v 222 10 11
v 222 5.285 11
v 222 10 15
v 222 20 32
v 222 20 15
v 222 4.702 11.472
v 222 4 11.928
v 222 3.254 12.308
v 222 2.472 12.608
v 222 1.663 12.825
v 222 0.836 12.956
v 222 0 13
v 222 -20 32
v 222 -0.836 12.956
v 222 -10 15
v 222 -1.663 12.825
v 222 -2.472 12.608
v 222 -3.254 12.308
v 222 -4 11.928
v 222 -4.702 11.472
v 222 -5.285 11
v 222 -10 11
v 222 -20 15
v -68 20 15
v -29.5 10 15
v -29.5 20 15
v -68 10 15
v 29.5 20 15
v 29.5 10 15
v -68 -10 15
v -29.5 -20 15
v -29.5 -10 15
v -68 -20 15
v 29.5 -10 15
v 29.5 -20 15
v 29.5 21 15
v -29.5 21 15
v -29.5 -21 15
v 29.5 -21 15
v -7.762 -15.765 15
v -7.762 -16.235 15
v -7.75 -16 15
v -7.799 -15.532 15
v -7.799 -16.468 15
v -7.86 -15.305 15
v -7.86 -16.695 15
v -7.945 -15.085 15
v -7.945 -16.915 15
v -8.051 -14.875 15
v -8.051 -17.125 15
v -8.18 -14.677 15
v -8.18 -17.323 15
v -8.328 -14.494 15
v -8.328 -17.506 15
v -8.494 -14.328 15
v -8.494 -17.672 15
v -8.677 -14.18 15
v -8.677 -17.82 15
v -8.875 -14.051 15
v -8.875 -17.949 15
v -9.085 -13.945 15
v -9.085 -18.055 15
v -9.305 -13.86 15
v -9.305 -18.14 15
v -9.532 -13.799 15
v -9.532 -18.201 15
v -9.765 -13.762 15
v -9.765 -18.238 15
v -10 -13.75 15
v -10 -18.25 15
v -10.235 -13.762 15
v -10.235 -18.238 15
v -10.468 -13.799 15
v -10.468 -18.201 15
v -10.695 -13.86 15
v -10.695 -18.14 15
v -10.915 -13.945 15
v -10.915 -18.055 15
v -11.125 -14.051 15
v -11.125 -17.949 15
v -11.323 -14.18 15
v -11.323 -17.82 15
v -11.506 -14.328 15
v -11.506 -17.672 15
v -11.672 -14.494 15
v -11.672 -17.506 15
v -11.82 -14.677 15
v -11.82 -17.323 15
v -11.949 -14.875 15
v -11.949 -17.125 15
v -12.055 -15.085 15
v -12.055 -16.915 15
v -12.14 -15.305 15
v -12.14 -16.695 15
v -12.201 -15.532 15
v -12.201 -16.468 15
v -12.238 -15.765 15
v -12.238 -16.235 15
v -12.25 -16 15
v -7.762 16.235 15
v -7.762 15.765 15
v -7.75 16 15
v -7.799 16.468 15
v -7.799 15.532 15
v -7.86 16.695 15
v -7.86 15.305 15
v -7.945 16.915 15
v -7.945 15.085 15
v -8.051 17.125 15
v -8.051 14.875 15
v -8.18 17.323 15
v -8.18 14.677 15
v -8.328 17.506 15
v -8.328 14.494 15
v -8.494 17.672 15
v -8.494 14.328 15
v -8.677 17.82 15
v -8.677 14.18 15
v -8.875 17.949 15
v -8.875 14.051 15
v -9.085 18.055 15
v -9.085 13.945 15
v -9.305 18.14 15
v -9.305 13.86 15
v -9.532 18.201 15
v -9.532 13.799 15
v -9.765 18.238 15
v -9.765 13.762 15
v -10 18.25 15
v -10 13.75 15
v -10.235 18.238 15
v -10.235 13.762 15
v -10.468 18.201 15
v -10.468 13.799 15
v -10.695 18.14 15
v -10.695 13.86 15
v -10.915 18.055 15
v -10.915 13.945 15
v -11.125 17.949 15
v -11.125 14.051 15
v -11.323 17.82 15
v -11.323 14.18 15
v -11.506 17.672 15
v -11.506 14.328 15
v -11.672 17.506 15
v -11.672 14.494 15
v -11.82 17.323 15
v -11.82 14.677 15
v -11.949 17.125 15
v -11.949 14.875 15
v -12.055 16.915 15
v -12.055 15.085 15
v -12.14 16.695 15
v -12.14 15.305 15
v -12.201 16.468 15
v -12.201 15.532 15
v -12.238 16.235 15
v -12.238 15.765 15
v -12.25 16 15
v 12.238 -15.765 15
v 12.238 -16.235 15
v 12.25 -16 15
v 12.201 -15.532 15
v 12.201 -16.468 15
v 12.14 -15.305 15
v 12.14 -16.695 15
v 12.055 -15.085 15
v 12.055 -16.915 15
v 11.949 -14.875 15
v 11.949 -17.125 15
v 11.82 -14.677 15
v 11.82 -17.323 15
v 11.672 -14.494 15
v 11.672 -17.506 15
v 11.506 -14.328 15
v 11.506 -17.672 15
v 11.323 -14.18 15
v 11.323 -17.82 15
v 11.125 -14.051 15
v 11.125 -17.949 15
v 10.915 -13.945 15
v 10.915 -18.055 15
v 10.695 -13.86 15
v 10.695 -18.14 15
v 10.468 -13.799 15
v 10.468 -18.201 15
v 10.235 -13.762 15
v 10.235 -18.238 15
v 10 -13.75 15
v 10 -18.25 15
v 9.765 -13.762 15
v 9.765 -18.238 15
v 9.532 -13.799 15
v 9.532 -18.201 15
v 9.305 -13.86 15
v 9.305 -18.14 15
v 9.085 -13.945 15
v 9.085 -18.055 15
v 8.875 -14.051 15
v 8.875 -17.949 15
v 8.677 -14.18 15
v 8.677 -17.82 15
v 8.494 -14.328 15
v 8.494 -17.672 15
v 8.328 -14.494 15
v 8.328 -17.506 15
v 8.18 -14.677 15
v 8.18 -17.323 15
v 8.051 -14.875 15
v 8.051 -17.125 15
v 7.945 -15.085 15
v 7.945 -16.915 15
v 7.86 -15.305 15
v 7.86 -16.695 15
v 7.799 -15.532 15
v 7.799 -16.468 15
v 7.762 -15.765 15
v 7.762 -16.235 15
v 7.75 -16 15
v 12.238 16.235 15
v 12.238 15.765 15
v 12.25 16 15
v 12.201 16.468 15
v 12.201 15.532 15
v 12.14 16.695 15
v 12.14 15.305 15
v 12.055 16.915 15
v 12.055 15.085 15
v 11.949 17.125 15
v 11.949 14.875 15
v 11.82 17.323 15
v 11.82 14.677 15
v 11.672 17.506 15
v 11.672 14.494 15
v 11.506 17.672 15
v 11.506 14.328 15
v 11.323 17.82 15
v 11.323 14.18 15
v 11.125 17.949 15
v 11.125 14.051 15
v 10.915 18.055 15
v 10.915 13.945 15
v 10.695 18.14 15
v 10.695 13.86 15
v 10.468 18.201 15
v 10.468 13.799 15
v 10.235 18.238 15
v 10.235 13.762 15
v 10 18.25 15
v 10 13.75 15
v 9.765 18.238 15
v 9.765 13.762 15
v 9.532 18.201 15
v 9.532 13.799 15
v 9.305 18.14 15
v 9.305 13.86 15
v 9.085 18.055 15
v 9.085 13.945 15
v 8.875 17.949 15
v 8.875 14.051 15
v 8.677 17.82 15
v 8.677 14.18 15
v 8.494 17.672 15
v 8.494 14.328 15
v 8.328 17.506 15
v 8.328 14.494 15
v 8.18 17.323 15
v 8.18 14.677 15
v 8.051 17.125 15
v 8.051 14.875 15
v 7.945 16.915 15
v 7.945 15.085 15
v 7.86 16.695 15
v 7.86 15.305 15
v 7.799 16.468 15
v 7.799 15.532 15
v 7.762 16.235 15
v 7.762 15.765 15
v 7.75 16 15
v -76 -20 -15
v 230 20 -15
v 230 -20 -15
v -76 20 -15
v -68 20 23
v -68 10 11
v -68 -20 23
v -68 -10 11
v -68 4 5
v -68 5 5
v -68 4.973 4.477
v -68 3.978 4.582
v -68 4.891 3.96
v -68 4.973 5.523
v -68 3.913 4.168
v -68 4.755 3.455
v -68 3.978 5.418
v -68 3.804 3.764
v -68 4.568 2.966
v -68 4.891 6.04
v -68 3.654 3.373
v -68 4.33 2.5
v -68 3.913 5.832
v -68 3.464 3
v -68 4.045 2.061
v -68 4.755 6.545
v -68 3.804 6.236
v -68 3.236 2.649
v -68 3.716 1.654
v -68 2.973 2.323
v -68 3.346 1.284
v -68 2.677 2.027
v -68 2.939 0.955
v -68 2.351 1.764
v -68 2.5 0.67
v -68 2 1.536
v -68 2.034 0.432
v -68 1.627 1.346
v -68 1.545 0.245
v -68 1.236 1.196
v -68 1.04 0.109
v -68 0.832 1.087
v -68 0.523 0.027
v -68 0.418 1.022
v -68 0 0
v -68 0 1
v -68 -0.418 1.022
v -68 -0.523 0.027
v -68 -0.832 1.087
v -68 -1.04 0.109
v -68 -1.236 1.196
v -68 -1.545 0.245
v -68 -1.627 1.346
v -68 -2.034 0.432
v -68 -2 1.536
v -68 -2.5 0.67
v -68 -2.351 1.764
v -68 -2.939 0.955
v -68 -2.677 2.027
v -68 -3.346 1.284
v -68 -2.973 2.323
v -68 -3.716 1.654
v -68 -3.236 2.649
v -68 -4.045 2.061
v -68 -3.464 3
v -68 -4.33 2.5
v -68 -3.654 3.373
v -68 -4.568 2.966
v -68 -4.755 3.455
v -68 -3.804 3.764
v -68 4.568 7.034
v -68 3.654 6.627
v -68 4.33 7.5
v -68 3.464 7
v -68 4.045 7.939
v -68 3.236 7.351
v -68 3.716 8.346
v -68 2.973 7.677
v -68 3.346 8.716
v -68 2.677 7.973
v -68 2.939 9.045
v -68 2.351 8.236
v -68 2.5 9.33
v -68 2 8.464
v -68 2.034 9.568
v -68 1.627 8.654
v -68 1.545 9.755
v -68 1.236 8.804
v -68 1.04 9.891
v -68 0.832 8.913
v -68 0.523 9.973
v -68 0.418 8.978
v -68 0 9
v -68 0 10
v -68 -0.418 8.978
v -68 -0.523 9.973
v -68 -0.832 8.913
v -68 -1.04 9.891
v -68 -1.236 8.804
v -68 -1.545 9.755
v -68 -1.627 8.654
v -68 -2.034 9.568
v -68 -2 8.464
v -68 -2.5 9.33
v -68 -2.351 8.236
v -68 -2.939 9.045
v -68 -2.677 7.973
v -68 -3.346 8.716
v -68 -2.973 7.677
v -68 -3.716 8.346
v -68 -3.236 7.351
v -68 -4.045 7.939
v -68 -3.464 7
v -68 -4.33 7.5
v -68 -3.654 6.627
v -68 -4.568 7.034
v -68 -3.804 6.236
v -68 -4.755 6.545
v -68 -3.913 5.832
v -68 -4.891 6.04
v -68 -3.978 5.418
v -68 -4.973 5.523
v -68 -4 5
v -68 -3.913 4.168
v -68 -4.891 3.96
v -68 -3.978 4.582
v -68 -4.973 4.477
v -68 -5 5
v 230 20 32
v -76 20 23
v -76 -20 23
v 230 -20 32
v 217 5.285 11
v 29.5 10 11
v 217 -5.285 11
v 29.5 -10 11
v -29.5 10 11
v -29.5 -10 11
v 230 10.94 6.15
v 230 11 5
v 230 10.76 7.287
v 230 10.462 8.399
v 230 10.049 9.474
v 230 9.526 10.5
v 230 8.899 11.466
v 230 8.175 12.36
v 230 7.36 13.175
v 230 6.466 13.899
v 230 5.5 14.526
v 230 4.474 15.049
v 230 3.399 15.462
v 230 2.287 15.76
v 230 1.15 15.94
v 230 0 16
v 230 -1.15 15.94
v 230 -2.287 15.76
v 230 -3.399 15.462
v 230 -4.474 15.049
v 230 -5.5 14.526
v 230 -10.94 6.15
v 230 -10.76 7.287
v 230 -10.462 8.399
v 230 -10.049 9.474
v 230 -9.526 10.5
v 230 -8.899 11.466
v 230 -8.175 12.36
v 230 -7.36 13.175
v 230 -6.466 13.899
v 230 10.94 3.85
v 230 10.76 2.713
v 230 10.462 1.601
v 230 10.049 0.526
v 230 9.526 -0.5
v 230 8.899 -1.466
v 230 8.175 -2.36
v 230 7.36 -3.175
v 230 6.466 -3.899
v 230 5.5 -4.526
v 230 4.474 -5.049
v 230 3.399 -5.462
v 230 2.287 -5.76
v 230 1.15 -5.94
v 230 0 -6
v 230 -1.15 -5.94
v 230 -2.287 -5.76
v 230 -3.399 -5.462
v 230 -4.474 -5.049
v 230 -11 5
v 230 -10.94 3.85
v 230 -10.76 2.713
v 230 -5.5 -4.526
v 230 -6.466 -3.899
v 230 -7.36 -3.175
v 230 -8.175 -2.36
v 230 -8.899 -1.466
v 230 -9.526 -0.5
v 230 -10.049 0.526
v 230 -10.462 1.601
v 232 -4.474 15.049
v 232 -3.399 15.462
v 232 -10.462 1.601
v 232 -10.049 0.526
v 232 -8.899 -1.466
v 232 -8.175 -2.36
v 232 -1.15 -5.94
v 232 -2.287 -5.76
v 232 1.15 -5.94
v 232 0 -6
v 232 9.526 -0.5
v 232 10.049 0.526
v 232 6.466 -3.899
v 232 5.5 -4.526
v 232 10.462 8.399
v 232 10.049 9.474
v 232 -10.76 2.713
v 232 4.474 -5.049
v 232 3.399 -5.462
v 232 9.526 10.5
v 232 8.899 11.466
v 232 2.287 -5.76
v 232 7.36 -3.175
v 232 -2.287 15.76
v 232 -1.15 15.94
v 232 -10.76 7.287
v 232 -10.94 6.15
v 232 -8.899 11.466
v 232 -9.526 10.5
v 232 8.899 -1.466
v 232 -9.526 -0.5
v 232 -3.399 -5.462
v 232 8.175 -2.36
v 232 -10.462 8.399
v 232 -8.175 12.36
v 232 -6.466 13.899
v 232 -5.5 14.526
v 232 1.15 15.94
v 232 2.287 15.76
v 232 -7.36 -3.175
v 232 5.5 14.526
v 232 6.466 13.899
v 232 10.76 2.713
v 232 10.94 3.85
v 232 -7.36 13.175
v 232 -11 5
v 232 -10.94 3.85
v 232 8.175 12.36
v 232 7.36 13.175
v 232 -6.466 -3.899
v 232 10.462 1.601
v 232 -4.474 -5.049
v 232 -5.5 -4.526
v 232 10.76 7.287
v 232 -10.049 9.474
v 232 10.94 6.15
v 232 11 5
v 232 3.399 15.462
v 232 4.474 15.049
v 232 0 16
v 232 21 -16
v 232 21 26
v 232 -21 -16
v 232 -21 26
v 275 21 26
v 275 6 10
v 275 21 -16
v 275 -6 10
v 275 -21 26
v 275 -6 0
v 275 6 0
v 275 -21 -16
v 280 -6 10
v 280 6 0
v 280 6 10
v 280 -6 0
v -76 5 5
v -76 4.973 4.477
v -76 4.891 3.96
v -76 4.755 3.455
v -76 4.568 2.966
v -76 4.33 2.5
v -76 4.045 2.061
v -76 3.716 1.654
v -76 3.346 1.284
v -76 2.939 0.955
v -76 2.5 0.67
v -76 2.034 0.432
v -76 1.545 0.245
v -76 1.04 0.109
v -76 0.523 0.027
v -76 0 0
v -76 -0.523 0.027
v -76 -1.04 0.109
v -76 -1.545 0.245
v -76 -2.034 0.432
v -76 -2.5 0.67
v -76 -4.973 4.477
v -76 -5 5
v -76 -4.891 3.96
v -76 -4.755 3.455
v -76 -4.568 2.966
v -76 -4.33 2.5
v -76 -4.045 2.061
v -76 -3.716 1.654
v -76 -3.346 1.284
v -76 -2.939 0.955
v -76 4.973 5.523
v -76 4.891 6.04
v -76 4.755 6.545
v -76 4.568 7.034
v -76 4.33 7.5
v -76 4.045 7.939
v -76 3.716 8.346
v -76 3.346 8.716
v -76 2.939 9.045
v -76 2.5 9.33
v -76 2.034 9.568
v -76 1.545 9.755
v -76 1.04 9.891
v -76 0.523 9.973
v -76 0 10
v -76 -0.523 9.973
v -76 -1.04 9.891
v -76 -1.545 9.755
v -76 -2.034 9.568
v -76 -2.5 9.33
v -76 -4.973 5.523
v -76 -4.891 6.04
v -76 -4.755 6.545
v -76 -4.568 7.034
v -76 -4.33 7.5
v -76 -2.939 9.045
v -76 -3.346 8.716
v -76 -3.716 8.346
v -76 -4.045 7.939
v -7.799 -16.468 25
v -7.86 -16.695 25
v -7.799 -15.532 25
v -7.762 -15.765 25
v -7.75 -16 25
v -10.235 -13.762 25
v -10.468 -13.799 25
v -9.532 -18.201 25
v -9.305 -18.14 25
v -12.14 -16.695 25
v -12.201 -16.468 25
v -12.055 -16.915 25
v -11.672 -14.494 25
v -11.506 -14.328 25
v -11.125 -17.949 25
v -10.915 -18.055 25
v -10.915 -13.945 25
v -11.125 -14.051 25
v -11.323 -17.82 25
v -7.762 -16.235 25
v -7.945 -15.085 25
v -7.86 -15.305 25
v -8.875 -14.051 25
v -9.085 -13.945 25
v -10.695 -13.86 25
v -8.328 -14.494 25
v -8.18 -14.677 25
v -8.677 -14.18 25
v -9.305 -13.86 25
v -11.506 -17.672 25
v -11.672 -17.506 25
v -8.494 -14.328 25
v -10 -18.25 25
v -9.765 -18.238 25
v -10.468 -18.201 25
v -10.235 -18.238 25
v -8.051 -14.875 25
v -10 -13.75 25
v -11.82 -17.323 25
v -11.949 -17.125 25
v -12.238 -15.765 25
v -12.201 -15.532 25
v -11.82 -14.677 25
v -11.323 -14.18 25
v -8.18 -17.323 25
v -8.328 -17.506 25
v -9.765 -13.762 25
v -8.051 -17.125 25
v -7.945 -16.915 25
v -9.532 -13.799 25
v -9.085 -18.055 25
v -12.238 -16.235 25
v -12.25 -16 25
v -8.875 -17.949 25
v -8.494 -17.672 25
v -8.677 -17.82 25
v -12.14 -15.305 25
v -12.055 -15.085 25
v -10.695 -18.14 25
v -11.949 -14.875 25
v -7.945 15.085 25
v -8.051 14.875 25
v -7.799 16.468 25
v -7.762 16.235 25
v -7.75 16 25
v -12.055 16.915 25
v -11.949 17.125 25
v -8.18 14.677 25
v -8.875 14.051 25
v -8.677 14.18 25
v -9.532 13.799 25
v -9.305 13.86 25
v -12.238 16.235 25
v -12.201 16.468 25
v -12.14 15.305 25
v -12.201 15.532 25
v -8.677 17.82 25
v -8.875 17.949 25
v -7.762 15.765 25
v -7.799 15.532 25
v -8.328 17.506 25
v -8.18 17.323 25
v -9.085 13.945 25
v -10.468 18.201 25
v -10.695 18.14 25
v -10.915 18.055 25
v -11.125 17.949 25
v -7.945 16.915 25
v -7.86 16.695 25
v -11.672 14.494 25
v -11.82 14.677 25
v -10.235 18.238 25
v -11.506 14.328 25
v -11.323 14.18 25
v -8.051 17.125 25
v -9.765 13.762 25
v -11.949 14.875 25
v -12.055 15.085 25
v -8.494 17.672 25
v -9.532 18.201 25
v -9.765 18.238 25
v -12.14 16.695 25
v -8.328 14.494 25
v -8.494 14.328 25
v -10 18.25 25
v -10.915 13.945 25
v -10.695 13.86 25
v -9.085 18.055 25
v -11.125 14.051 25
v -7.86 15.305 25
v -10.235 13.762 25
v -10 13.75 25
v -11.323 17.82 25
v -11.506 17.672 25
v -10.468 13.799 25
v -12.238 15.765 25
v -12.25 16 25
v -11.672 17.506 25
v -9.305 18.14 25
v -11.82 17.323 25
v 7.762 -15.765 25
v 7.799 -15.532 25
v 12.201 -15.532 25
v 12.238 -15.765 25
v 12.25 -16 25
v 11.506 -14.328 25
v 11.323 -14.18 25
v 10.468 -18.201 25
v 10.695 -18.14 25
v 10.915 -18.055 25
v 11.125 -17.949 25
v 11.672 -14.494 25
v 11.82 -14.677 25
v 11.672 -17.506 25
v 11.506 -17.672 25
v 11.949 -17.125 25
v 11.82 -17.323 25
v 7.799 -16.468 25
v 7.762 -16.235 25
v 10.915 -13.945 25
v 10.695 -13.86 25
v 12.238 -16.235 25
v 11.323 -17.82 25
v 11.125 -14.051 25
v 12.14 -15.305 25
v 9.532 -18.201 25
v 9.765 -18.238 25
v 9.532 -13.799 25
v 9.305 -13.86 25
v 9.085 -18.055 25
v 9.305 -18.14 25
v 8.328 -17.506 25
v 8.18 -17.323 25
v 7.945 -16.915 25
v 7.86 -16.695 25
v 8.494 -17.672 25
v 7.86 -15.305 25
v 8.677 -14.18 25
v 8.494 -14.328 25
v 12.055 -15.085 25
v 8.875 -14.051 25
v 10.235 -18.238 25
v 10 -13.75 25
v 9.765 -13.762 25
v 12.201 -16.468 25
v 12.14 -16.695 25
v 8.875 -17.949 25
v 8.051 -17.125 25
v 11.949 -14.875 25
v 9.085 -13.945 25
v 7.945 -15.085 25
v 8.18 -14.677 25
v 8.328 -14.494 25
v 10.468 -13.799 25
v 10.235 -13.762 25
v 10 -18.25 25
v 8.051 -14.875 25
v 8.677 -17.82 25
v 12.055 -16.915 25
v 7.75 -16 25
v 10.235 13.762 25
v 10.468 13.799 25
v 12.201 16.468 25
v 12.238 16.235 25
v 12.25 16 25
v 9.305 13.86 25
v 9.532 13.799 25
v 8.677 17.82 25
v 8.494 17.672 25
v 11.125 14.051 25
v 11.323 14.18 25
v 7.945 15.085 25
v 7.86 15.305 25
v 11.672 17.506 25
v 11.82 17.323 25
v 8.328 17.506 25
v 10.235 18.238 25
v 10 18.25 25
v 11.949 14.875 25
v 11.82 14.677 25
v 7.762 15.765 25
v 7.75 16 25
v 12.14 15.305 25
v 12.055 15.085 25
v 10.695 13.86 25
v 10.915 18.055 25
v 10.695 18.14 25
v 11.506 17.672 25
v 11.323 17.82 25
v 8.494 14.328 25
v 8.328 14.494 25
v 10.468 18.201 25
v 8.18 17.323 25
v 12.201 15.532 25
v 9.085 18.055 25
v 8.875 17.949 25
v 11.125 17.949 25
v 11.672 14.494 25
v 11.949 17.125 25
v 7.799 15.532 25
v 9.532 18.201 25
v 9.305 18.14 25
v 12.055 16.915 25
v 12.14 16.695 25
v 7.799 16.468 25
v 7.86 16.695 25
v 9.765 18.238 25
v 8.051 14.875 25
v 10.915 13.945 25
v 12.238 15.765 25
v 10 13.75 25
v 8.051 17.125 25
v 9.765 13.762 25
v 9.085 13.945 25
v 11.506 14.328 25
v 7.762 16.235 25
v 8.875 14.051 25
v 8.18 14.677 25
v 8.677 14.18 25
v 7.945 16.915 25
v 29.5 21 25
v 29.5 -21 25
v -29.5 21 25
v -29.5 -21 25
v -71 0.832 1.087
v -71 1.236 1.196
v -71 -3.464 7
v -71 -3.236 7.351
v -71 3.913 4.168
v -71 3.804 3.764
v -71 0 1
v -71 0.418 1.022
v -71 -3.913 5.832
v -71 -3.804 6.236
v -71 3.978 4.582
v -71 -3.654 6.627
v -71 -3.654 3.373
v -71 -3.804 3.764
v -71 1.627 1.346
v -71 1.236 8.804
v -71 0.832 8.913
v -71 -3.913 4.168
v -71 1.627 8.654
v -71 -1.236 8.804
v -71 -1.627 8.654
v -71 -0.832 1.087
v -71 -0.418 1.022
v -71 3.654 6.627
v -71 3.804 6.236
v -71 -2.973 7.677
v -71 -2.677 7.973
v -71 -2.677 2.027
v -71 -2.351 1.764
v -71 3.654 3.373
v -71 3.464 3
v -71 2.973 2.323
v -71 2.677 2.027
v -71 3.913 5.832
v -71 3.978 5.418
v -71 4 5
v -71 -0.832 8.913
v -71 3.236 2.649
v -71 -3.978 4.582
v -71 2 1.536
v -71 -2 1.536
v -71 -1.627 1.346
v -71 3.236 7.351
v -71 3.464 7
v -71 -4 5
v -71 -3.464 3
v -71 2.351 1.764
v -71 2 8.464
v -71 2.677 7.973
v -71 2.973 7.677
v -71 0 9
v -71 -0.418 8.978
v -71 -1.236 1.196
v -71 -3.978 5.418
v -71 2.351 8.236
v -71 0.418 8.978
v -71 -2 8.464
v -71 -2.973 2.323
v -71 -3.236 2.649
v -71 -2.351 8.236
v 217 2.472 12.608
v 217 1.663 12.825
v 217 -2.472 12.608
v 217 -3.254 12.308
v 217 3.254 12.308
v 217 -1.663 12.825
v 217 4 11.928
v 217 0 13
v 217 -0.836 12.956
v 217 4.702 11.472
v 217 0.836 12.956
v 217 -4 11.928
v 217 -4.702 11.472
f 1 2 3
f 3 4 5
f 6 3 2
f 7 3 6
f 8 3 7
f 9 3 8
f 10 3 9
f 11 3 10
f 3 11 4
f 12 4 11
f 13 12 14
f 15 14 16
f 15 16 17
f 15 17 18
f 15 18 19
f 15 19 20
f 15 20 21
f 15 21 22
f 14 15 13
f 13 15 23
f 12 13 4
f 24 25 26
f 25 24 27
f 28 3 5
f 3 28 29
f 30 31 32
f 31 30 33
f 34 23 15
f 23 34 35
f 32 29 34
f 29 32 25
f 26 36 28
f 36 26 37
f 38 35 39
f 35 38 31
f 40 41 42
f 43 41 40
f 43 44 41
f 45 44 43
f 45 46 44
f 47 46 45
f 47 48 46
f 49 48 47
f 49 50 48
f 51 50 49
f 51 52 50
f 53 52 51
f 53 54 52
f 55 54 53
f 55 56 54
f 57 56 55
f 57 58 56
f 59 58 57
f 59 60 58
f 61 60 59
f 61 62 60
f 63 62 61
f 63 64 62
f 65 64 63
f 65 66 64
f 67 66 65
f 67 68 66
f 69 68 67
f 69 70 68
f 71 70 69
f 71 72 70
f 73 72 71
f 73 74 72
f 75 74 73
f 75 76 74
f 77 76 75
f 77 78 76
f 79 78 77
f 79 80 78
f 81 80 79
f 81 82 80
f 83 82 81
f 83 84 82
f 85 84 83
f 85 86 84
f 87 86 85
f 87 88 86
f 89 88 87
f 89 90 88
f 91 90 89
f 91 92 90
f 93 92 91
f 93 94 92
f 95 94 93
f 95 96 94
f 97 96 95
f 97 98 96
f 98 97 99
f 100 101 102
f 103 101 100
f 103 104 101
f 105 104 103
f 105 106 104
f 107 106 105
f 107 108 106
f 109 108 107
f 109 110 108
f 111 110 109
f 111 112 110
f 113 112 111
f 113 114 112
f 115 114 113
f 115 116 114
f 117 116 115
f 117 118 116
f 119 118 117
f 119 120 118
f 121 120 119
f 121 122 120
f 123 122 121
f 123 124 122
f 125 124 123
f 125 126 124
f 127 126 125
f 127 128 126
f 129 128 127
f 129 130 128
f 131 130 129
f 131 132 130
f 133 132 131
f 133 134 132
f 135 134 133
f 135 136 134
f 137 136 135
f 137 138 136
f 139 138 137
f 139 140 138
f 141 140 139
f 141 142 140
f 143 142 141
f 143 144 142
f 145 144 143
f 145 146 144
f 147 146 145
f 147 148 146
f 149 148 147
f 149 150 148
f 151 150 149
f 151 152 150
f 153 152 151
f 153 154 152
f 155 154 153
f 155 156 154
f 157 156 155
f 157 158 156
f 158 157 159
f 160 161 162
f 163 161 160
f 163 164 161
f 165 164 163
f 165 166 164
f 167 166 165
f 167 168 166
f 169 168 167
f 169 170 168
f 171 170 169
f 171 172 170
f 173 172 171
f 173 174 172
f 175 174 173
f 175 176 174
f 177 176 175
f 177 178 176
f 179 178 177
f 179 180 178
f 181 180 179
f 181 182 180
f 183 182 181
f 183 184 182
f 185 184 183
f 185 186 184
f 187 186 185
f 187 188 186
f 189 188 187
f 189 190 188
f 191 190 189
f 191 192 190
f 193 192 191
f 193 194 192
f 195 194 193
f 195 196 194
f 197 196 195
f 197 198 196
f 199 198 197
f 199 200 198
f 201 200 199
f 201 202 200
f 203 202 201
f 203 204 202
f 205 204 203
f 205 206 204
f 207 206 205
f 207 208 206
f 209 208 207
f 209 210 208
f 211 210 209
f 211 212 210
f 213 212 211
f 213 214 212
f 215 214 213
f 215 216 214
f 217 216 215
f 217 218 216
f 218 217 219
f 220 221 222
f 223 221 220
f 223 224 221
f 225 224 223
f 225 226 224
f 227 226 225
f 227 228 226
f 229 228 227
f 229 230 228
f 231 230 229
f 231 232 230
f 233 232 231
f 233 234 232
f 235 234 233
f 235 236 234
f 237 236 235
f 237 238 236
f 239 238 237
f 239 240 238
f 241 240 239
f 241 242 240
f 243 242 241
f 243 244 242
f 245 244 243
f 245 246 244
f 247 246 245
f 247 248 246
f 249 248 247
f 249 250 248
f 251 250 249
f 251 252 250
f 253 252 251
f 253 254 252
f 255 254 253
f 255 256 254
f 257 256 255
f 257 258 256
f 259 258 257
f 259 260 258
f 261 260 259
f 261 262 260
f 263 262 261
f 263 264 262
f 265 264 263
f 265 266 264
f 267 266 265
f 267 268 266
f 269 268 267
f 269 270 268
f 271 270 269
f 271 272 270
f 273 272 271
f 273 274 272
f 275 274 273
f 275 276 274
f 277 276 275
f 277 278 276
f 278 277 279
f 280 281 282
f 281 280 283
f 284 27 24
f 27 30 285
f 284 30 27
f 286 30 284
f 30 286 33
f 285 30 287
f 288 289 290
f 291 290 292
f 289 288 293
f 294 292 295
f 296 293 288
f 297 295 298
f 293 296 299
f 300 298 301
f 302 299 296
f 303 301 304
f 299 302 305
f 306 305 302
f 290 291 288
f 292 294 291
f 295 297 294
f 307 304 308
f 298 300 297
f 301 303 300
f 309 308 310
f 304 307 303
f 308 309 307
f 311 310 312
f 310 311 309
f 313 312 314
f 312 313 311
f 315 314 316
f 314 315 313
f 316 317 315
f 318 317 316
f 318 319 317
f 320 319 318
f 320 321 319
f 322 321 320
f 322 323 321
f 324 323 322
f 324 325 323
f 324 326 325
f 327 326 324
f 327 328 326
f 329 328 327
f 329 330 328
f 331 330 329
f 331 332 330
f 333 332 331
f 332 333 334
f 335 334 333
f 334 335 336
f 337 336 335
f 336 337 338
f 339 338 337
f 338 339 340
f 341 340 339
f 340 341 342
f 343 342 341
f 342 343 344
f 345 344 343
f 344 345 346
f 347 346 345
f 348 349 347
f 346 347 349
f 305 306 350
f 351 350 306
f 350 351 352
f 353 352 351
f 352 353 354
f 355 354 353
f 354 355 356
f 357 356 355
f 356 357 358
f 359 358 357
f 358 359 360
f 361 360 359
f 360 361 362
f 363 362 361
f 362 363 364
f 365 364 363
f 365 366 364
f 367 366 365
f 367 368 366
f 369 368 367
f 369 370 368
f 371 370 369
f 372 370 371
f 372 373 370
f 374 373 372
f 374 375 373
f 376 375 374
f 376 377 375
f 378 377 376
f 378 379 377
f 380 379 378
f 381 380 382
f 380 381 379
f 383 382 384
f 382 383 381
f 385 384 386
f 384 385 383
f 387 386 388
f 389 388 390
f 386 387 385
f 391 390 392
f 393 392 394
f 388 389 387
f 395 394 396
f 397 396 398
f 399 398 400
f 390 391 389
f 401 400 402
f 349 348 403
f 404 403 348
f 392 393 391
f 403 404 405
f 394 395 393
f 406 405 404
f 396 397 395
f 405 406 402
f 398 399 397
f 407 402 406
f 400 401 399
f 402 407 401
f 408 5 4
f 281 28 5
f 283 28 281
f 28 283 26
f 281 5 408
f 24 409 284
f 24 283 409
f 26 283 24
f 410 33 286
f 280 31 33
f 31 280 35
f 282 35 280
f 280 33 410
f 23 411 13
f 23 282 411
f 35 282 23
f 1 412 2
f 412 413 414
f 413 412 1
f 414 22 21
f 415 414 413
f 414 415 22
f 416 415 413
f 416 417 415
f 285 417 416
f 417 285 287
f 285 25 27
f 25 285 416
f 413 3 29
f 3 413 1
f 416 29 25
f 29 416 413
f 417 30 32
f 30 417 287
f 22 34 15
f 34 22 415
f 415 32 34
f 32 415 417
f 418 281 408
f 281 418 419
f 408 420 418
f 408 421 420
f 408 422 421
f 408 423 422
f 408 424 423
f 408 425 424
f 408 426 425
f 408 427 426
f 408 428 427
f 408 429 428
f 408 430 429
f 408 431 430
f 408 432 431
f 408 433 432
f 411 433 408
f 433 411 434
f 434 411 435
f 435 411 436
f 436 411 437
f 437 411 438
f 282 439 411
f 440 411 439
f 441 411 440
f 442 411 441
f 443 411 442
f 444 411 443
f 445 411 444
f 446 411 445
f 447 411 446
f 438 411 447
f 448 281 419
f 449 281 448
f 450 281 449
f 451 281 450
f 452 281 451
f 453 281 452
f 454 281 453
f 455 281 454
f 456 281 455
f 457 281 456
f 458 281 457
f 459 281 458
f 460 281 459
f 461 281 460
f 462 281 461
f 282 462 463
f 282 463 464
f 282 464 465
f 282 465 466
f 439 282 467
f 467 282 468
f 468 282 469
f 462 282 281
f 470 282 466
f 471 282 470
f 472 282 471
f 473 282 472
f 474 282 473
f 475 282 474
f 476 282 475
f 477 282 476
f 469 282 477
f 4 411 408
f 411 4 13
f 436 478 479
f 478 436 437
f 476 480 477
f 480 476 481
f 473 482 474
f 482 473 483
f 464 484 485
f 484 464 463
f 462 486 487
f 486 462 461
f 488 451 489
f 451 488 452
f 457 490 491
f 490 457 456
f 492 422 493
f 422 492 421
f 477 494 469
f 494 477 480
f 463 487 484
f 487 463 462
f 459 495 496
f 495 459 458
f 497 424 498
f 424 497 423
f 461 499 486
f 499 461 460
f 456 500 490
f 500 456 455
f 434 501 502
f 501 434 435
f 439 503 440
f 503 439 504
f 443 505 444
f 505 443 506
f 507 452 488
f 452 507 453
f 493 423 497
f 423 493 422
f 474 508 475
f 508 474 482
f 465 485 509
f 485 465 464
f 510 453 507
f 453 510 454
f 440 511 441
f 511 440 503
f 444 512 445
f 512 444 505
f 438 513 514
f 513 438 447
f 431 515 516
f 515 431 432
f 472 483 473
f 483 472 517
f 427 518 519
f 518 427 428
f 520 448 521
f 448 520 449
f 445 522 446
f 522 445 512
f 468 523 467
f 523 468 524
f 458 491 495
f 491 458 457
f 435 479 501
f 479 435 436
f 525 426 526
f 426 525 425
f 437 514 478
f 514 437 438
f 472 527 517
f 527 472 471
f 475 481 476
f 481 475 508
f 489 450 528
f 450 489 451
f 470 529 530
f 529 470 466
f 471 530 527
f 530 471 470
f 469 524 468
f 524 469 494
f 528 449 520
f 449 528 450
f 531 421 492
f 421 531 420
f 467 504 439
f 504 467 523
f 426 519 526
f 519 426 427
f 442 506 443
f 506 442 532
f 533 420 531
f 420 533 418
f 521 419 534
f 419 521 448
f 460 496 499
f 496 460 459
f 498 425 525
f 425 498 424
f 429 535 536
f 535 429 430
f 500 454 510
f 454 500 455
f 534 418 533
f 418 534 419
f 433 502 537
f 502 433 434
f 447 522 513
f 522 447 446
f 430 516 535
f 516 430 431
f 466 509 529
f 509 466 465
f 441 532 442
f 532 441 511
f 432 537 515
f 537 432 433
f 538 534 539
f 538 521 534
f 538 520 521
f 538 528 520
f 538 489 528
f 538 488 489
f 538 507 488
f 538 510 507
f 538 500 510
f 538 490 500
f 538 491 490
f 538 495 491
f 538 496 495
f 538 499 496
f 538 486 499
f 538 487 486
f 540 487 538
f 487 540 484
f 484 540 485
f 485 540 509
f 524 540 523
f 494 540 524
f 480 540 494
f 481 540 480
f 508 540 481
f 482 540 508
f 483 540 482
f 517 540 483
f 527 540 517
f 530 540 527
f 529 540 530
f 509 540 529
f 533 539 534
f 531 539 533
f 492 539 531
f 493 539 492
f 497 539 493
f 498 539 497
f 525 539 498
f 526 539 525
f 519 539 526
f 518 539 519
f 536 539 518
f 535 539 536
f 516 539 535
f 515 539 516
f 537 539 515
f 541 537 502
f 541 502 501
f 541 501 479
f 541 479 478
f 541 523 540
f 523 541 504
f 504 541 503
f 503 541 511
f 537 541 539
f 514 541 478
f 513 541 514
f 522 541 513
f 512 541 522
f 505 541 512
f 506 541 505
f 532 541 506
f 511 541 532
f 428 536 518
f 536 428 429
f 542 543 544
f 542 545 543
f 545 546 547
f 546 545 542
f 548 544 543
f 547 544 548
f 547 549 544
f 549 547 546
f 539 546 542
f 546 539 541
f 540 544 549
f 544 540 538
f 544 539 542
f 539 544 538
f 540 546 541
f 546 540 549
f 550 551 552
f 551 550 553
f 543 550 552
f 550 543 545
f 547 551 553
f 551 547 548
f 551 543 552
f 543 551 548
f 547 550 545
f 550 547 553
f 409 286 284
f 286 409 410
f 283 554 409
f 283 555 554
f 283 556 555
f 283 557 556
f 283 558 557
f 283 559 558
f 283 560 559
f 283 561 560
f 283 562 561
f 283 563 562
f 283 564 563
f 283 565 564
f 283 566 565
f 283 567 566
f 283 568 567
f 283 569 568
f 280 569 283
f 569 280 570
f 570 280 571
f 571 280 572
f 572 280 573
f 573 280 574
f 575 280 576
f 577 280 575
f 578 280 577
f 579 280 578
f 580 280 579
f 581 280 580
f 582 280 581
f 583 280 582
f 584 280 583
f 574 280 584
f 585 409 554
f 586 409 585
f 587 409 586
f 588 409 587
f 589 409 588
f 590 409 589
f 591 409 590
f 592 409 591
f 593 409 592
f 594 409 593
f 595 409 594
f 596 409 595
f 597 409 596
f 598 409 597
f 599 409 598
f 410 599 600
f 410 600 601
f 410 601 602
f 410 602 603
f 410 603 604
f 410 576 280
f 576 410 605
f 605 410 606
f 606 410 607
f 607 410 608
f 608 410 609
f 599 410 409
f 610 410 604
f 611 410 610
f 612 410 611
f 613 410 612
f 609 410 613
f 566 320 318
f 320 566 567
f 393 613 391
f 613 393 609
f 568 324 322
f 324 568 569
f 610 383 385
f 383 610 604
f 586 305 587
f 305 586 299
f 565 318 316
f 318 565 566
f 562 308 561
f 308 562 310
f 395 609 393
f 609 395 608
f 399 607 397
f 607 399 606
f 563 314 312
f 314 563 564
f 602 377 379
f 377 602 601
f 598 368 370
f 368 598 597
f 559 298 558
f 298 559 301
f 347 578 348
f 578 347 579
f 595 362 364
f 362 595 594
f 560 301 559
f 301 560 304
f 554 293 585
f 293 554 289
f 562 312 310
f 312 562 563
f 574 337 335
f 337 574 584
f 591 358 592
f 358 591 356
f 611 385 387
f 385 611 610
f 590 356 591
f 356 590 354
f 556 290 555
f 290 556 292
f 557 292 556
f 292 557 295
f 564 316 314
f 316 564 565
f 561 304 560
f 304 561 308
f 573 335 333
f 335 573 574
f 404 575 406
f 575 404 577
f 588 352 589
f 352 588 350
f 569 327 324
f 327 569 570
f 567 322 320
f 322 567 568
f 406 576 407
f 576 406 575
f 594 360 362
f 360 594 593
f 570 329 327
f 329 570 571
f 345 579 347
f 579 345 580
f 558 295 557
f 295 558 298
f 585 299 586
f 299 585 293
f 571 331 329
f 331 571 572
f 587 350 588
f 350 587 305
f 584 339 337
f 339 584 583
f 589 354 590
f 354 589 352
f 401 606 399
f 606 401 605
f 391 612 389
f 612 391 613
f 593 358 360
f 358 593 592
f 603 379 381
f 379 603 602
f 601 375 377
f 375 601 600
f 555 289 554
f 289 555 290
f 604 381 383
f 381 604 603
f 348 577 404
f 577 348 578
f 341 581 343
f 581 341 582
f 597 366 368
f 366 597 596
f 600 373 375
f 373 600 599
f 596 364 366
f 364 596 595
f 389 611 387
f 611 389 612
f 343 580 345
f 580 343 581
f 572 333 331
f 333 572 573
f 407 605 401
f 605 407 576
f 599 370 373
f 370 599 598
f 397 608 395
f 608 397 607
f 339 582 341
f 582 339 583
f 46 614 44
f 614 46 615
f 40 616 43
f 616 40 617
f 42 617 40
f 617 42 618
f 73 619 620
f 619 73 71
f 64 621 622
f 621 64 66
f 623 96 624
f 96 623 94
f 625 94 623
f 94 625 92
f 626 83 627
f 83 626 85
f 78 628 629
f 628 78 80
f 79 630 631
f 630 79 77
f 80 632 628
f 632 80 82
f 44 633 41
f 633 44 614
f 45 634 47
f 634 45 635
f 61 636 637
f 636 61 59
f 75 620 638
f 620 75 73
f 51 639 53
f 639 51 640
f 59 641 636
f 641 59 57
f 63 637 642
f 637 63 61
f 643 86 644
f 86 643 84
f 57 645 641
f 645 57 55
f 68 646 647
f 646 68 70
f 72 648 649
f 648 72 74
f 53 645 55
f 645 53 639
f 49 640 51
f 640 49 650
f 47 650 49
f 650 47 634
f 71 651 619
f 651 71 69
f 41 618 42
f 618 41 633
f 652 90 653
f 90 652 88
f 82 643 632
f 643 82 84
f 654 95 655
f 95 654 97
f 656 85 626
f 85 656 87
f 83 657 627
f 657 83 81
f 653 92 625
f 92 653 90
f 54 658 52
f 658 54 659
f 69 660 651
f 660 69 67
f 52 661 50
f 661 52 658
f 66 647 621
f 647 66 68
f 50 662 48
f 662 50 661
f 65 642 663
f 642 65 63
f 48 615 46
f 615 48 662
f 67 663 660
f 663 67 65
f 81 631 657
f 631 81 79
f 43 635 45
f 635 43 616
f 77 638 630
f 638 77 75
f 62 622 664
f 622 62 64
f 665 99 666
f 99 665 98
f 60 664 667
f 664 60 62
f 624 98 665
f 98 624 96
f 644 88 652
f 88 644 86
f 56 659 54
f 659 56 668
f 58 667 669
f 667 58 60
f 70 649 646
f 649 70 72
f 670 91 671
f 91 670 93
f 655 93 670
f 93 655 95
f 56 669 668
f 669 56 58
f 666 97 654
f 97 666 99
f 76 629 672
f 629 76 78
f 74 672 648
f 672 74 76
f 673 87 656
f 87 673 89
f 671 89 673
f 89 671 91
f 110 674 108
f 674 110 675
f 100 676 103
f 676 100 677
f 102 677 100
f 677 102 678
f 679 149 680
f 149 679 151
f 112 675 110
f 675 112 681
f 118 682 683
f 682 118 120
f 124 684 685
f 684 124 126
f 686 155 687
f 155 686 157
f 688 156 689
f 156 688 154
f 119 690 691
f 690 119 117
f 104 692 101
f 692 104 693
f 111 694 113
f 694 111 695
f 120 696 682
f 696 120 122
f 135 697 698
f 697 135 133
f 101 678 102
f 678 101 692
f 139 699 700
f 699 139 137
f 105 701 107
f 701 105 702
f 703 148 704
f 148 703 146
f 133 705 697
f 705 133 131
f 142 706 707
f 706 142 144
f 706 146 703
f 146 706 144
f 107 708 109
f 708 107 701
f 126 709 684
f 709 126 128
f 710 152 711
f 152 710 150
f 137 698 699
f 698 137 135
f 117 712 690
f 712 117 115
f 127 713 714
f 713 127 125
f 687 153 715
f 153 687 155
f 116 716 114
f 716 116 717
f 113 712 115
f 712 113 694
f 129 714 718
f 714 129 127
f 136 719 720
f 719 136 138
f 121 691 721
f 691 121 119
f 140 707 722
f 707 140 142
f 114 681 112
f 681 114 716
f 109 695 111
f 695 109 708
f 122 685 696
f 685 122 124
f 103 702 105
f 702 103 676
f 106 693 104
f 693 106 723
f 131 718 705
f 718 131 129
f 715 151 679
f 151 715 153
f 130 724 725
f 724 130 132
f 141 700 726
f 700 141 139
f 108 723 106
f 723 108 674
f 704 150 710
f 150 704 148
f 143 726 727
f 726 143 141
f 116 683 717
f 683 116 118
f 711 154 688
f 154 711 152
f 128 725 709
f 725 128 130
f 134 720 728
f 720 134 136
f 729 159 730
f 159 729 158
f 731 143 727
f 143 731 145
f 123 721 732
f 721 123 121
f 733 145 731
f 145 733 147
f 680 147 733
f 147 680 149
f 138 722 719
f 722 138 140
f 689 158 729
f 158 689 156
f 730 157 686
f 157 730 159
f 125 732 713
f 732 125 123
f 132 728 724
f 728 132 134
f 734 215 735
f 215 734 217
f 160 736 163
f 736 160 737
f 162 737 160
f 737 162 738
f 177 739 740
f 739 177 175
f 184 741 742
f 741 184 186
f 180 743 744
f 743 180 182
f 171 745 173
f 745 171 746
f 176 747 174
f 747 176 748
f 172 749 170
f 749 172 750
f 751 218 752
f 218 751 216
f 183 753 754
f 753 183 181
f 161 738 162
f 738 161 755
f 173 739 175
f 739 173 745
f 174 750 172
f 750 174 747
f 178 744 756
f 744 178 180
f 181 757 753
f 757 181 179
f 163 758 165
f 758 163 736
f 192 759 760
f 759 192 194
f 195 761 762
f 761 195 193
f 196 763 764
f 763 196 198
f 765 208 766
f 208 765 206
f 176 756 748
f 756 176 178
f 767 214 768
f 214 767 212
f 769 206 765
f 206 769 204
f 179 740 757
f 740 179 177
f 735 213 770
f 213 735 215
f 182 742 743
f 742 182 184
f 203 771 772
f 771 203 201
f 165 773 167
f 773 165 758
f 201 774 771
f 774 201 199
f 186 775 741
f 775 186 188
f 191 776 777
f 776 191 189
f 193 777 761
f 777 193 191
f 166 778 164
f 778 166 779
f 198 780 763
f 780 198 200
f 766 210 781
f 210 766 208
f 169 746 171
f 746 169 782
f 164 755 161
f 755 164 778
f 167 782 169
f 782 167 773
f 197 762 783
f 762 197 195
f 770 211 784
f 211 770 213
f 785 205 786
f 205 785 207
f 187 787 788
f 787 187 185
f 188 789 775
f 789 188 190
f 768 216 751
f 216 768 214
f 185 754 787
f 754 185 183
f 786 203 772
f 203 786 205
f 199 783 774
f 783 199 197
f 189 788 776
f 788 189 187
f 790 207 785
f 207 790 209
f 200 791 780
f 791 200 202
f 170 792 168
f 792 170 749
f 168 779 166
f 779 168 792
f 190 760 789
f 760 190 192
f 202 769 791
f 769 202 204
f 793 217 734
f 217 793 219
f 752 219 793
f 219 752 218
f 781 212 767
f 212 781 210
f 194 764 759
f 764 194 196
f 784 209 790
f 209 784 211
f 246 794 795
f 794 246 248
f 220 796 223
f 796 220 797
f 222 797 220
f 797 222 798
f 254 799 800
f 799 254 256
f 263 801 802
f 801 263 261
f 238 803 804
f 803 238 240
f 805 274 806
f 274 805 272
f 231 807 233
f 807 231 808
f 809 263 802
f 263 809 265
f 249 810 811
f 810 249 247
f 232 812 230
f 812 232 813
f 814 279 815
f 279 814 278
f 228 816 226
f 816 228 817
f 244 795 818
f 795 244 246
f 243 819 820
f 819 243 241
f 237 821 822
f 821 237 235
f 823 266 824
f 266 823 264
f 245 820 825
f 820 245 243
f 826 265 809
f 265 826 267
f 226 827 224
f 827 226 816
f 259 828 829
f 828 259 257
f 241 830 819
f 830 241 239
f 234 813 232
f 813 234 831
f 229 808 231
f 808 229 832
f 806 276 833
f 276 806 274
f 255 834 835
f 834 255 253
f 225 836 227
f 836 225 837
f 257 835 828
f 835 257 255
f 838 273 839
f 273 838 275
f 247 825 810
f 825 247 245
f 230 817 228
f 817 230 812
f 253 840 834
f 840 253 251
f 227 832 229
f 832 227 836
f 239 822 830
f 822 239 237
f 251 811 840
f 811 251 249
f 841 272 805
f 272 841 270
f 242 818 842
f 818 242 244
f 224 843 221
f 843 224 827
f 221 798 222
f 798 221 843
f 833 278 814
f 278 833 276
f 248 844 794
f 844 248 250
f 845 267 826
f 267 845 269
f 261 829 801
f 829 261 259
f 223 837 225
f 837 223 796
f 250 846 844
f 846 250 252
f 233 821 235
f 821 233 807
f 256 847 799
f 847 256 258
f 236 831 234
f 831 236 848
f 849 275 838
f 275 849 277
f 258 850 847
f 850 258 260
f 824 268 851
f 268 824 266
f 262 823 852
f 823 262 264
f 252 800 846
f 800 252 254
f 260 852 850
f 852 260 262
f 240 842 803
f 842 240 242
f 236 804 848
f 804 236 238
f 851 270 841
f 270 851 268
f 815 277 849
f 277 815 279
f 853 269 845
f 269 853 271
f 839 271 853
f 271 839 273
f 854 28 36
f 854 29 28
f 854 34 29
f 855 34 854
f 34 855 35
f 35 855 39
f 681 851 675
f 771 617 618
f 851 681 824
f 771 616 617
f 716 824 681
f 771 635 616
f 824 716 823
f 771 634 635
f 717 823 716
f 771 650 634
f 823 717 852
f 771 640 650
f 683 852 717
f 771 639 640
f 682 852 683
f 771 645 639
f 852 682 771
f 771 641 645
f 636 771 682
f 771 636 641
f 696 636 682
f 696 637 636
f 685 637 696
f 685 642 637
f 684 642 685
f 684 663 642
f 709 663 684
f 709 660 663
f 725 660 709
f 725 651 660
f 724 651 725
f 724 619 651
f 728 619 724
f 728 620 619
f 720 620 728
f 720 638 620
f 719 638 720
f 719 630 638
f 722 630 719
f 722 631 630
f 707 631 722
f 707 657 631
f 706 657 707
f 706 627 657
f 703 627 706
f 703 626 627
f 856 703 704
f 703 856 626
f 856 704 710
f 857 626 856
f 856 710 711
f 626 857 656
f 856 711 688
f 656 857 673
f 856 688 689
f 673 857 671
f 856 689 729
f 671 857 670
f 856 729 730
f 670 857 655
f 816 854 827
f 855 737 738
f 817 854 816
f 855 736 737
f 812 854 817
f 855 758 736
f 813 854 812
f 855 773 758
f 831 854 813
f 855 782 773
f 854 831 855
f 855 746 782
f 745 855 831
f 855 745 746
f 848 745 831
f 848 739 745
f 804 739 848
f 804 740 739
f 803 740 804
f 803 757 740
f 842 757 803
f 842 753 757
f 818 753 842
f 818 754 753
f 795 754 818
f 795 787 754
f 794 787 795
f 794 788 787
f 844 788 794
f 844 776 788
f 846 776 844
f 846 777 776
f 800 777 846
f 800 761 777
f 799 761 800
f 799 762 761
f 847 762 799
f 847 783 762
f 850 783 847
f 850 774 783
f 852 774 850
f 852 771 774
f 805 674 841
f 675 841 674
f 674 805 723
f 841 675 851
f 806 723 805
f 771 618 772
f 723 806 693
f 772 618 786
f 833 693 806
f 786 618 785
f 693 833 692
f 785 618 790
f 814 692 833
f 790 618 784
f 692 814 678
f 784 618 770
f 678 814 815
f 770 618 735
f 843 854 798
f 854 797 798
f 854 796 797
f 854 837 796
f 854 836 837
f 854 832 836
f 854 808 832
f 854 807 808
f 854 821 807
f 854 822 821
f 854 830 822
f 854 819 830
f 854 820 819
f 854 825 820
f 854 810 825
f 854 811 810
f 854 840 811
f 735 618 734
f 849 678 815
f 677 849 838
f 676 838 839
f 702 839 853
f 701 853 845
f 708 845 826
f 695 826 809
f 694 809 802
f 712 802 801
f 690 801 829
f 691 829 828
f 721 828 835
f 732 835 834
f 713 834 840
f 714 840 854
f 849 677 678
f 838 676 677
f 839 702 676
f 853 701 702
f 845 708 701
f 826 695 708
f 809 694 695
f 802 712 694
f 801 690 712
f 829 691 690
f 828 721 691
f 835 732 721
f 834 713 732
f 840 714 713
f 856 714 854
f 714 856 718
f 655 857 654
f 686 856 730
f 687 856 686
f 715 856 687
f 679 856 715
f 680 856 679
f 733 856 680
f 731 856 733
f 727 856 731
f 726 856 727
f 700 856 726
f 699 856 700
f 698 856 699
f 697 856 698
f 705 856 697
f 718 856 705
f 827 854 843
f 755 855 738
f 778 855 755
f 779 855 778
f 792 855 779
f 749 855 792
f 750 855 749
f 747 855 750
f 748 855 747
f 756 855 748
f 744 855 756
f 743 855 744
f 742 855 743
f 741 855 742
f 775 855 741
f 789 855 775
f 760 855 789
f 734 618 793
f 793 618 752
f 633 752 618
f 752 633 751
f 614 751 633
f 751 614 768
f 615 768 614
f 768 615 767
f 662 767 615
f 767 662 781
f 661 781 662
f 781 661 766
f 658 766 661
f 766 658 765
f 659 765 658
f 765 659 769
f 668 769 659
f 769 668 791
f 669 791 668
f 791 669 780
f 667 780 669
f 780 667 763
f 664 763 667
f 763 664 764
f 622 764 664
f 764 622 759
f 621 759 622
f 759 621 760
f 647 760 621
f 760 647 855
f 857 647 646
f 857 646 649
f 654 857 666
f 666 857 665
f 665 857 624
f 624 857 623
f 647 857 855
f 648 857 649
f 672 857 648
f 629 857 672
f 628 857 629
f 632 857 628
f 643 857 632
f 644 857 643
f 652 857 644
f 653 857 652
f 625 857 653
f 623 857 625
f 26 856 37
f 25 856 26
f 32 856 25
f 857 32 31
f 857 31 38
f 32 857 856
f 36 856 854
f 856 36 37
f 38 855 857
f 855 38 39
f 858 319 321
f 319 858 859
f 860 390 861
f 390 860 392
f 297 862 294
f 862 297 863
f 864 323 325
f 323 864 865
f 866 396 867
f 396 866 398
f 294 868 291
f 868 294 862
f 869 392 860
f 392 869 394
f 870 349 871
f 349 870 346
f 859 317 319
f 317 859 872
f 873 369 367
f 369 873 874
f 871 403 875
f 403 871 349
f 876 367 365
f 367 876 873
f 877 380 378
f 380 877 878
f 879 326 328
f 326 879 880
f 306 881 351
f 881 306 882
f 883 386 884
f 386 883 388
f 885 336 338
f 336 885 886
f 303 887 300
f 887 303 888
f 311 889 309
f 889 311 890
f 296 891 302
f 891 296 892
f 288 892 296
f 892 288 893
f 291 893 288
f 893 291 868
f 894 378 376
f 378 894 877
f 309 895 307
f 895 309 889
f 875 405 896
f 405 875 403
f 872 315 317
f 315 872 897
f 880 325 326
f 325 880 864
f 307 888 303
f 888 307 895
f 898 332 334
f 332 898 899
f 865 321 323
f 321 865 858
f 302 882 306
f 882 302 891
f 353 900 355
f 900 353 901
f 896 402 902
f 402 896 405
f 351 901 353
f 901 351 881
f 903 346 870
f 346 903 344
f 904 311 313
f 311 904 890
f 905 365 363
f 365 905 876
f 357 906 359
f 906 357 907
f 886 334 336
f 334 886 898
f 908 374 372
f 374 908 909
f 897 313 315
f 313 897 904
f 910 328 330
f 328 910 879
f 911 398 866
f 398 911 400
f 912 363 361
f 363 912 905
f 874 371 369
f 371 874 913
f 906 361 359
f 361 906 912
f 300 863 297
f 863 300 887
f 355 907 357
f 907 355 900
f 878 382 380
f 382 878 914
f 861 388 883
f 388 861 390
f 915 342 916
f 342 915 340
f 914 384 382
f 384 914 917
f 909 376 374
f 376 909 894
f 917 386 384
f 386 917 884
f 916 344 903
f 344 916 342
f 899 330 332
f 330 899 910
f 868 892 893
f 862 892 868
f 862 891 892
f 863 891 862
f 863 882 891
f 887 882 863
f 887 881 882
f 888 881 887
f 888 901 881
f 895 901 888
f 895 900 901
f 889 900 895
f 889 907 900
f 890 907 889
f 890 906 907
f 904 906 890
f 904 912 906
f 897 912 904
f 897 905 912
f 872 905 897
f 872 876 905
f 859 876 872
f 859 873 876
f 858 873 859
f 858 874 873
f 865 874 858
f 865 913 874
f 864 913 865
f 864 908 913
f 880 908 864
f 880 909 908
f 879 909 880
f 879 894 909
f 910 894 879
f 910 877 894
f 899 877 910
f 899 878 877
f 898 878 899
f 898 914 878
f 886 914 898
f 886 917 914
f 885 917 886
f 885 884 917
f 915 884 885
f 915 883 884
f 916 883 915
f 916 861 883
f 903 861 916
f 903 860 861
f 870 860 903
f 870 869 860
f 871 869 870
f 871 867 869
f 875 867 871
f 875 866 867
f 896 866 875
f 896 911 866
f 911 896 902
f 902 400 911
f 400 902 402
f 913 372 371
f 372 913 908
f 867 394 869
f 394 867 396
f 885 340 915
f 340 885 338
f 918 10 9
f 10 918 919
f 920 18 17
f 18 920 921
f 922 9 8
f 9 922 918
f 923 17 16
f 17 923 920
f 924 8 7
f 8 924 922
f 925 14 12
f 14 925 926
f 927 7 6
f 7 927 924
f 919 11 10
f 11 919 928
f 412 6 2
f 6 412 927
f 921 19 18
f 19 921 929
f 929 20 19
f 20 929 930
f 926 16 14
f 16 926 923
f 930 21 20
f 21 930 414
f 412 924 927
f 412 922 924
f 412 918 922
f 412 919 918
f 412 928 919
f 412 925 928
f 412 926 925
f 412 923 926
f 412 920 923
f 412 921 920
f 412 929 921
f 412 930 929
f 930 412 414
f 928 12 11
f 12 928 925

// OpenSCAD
// file: _params.scad
// =========================================================================
// 공유 파라미터 (모든 개별 부품 파일에서 include)
// 메인 어셈블리: cup_z_x_catrage_frame_water_mic_anti_3030.scad 에서 추출
// 프레임: 600 × 420 × 700mm (3030 프로파일, Y=0 대칭)
// =========================================================================

$fn = 60;  // 부품 출력용 고해상도
GLOBAL_TOLERANCE = 0.2;

// --- [1] 하부 기성품 및 원통 파라미터 ---
X_RAIL_LEN = 290.0;
X_BLOCK_W = 42.0; X_BLOCK_L = 59.0;
X_PITCH_X = 20.0; X_PITCH_Y = 32.0;
X_RAIL_W = 40.0;  X_RAIL_H = 30.0;

MOTOR_W = 42.0;      MOTOR_PITCH = 31.0; MOTOR_HOLE_D = 3.5;    
MOTOR_BOSS_D = 22.0; MOTOR_BOSS_H = 2.0; SCREW_D = 8.0;         

CUP_ID = 100.0;  CUP_WALL = 5.0; CUP_OD = 110.0;     // 아크릴 원통 OD110/ID100
CUP_H = 180.0;   CAGE_H = 60.0;  FLOOR_H = 10.0; PISTON_H = 20.0;     

LIP_D = 30.0;    LIP_H = 5.0;    LEAK_DRAIN_D = 4.0;    
GUIDE_PIPE_D = 10.0; BUSHING_OD = 12.0; BUSHING_H = 8.0;       
DRAIN_RADIUS = 35.0; DRAIN_D = 10.0;        

Y_OFFSET = 85.0; BRKT_H = 12.0; BRKT_D = 122.0; BRKT_ID = 62.0; Z_MOUNT_PCD = 86.0;   

// --- [2] 아크릴 파이프 및 상부 카트리지 ---
ACRYL_ID = 100.0; ACRYL_T = 5.0; ACRYL_OD = ACRYL_ID + (ACRYL_T * 2);  // OD110 (아크릴집 106 재고없음 → 컵과 동일 규격)

REVOLVER_PCD = 240.0;     // 인접 카트리지 웹 9.8mm 확보 (OD110 대응, 230→240)
CARTRIDGE_OD = REVOLVER_PCD + ACRYL_OD + 8; 
TOP_PLATE_H = 15.0;       // 아크릴 15T 통판 (보스홀 단 깊이 10mm)

HUB_D = 60.0;            
SHAFT_D = 12.0;          
HUB_WALL = 4.0;          
HUB_H = 15.0;             // 아크릴 5T × 3장 적층 — 파이프 130mm 대응
POCKET_DEPTH = 5.0;
MID_HUB_Z = 68.5;          // 중단 허브 하면 Z (FLOAT_H=2 보정, 절대좌표 유지)
UPPER_HUB_Z = 135.0;       // 상단 허브 하면 Z (전체 135+15=150 유지)
BOSS_OD = 35.0;
BOSS_H = 11.0;             // 보스11 + 와셔1 = 12, 리세스10 → 허브 2mm 공중

// --- [3] GT2 벨트 구동 시스템 ---
GT2_PITCH     = 2.0;
GT2_BELT_W    = 6.0;
BIG_PULLEY_TEETH = 566;
BIG_PULLEY_PD = BIG_PULLEY_TEETH * GT2_PITCH / PI;
BIG_PULLEY_OD = BIG_PULLEY_PD + 1.0;
SMALL_PULLEY_TEETH = 20;
SMALL_PULLEY_PD = SMALL_PULLEY_TEETH * GT2_PITCH / PI;
SMALL_PULLEY_OD = SMALL_PULLEY_PD + 1.0;

BELT_MOTOR_X = -300;
BELT_MOTOR_Y = -155.5;
BRKT_MOTOR_H = 25.0;
BRKT_MOTOR_W = 45.0;
SLOT_LEN = 10.0;
FLAG_W = 15.0;  FLAG_H = 8.0;  FLAG_T = 1.5;

X_POS_MEASURE = 170.0;   // X_M~X_R 정중앙, X대칭

// --- [4] 3030 프레임 경계 (600×430×700mm) ---
PF = 30;             // 3030 알루미늄 프로파일
WASHER_T = 1.0;     

X_L = -320;
X_M = 60;
X_R = 250;
Y_F = -210;          // 전방 (대칭: -210+30=-180, Y=0 중심)
Y_B = 180;           // 후방 (대칭: 180+30=210, Y=0 중심) — 메인파일과 동기화

Z_BOT = -480;
Z_RAIL = -322;
Z_MID = -TOP_PLATE_H - PF;
Z_TOP = 220;

SUPPORT_PILLAR_H = Z_TOP - PF;

SHAFT_SQ = 20;       // 2020 사각 회전축

// 사각 축 홀 크기
SQ = SHAFT_SQ + GLOBAL_TOLERANCE;  // 20.2mm

// --- 리볼버/컵 축 정렬 (보스홀=판 중심에 리볼버 정렬) ---
REVOLVER_CX = (X_L + X_M + PF)/2;        // 판 중심 = 보스홀 = 리볼버 회전축 (-115)
DROP_X      = REVOLVER_CX + REVOLVER_PCD/2;  // 링 드롭 / 컵 적재 축 (+5)

// --- [5] 모터 체결홀 (베이스 플레이트 ↔ 모터 브래킷 슬롯 공유) ---
MOTOR_BOLT_PITCH    = 25;        // Y피치 (모터축 기준 ±12.5)
MOTOR_BOLT_X_NOMINAL = X_L + 55; // 1열: 판 좌단 55 (모터 기본 위치)
MOTOR_BOLT_X_SHIFT   = X_L + 40; // 2열: 판 좌단 40 (모터 좌측 이동 대비)

// 모터 마운트 볼트 카운터보어 (단볼트용 — 브래킷 두께 25 중 깊게 파냄)
MOTOR_CB_D     = 6.5;            // M3 캡볼트 머리 클리어런스
MOTOR_CB_DEPTH = 19;             // 카운터보어 깊이 (잔여 통과 6mm → M3×10 단볼트)
// main file
// =========================================================================
// [구매] X축 리니어 스테이션 세트 × 2 (전방 Y=-85, 후방 Y=+85)
// 구매: 리니어 레일(290mm) + 슬라이더 + NEMA17 + 리드스크류 + 엔드브래킷 + 커플링
// 메인 파일 x_stage_rail_dummy() + x_slider_block_dummy() 그대로 복사
// =========================================================================
include <_params.scad>

SCREW_CZ = 5;
MOT_BODY_L = 43;
BRKT_T_X = 8;
MOTOR_EXTEND = BRKT_T_X + MOTOR_BOSS_H + MOT_BODY_L + 5;
RAIL_END_X = (X_R + PF) - MOTOR_EXTEND;
RAIL_START_X = RAIL_END_X - X_RAIL_LEN;

// ── ① 알루미늄 레일 프로파일 본체 (40W × 30H) ──
color([0.78, 0.78, 0.78]) difference() {
    translate([RAIL_START_X, -X_RAIL_W/2, -X_RAIL_H/2])
        cube([X_RAIL_LEN, X_RAIL_W, X_RAIL_H]);
    translate([RAIL_START_X - 1, -10, X_RAIL_H/2 - 4])
        cube([X_RAIL_LEN + 2, 20, 5]);
}

// ── ② 리드 스크류 (ø8) ──
color([0.60, 0.60, 0.60])
    translate([RAIL_START_X - 3, 0, SCREW_CZ])
        rotate([0, 90, 0]) cylinder(d=SCREW_D, h=X_RAIL_LEN + 6);

// ── ③ +X 엔드 브래킷 (모터 마운트) ──
color([0.12, 0.12, 0.12]) difference() {
    translate([RAIL_END_X, -X_RAIL_W/2, -X_RAIL_H/2])
        cube([BRKT_T_X, X_RAIL_W, X_RAIL_H + 17]);
    translate([RAIL_END_X - 1, 0, SCREW_CZ])
        rotate([0, 90, 0]) cylinder(d=12, h=BRKT_T_X + 2);
}

// ── ④ NEMA 17 스테퍼 모터 ──
translate([RAIL_END_X + BRKT_T_X, 0, SCREW_CZ]) {
    color([0.25, 0.25, 0.25])
        rotate([0, 90, 0]) cylinder(d=MOTOR_BOSS_D, h=MOTOR_BOSS_H);
    color([0.15, 0.15, 0.15])
        translate([MOTOR_BOSS_H, -MOTOR_W/2, -MOTOR_W/2])
            cube([MOT_BODY_L, MOTOR_W, MOTOR_W]);
    color([0.9, 0.9, 0.9])
        translate([MOTOR_BOSS_H + MOT_BODY_L, -6, -5])
            cube([5, 12, 10]);
}

// ── ⑤ 축 커플링 (블루 알루미늄) ──
color([0.1, 0.45, 0.8])
    translate([RAIL_END_X - 5, 0, SCREW_CZ])
        rotate([0, 90, 0]) cylinder(d=16, h=16);

// ── ⑥ -X 엔드 브래킷 (베어링 서포트) ──
color([0.12, 0.12, 0.12]) difference() {
    translate([RAIL_START_X - BRKT_T_X, -X_RAIL_W/2, -X_RAIL_H/2])
        cube([BRKT_T_X, X_RAIL_W, X_RAIL_H + 8]);
    translate([RAIL_START_X - BRKT_T_X - 1, 0, SCREW_CZ])
        rotate([0, 90, 0]) cylinder(d=10, h=BRKT_T_X + 2);
}

// ── ⑦ 캐리지 슬라이더 블록 ──
color([0.2, 0.2, 0.2]) difference() {
    translate([-X_BLOCK_L/2, -X_BLOCK_W/2, X_RAIL_H/2])
        cube([X_BLOCK_L, X_BLOCK_W, 10]);
    for(x = [-X_PITCH_X/2, X_PITCH_X/2])
        for(y = [-X_PITCH_Y/2, X_PITCH_Y/2])
            translate([x, y, X_RAIL_H/2 - 1]) cylinder(d=4.5, h=12);
}
// 리드넛 하우징
color([0.18, 0.18, 0.18])
    translate([-12, -10, SCREW_CZ - 10]) cube([24, 20, 15]);
// 가이드 슈
color([0.15, 0.15, 0.15])
    for(sy = [-1, 1])
        translate([-X_BLOCK_L/2, sy * 15 - 5, X_RAIL_H/2 - 5])
            cube([X_BLOCK_L, 10, 5]);
